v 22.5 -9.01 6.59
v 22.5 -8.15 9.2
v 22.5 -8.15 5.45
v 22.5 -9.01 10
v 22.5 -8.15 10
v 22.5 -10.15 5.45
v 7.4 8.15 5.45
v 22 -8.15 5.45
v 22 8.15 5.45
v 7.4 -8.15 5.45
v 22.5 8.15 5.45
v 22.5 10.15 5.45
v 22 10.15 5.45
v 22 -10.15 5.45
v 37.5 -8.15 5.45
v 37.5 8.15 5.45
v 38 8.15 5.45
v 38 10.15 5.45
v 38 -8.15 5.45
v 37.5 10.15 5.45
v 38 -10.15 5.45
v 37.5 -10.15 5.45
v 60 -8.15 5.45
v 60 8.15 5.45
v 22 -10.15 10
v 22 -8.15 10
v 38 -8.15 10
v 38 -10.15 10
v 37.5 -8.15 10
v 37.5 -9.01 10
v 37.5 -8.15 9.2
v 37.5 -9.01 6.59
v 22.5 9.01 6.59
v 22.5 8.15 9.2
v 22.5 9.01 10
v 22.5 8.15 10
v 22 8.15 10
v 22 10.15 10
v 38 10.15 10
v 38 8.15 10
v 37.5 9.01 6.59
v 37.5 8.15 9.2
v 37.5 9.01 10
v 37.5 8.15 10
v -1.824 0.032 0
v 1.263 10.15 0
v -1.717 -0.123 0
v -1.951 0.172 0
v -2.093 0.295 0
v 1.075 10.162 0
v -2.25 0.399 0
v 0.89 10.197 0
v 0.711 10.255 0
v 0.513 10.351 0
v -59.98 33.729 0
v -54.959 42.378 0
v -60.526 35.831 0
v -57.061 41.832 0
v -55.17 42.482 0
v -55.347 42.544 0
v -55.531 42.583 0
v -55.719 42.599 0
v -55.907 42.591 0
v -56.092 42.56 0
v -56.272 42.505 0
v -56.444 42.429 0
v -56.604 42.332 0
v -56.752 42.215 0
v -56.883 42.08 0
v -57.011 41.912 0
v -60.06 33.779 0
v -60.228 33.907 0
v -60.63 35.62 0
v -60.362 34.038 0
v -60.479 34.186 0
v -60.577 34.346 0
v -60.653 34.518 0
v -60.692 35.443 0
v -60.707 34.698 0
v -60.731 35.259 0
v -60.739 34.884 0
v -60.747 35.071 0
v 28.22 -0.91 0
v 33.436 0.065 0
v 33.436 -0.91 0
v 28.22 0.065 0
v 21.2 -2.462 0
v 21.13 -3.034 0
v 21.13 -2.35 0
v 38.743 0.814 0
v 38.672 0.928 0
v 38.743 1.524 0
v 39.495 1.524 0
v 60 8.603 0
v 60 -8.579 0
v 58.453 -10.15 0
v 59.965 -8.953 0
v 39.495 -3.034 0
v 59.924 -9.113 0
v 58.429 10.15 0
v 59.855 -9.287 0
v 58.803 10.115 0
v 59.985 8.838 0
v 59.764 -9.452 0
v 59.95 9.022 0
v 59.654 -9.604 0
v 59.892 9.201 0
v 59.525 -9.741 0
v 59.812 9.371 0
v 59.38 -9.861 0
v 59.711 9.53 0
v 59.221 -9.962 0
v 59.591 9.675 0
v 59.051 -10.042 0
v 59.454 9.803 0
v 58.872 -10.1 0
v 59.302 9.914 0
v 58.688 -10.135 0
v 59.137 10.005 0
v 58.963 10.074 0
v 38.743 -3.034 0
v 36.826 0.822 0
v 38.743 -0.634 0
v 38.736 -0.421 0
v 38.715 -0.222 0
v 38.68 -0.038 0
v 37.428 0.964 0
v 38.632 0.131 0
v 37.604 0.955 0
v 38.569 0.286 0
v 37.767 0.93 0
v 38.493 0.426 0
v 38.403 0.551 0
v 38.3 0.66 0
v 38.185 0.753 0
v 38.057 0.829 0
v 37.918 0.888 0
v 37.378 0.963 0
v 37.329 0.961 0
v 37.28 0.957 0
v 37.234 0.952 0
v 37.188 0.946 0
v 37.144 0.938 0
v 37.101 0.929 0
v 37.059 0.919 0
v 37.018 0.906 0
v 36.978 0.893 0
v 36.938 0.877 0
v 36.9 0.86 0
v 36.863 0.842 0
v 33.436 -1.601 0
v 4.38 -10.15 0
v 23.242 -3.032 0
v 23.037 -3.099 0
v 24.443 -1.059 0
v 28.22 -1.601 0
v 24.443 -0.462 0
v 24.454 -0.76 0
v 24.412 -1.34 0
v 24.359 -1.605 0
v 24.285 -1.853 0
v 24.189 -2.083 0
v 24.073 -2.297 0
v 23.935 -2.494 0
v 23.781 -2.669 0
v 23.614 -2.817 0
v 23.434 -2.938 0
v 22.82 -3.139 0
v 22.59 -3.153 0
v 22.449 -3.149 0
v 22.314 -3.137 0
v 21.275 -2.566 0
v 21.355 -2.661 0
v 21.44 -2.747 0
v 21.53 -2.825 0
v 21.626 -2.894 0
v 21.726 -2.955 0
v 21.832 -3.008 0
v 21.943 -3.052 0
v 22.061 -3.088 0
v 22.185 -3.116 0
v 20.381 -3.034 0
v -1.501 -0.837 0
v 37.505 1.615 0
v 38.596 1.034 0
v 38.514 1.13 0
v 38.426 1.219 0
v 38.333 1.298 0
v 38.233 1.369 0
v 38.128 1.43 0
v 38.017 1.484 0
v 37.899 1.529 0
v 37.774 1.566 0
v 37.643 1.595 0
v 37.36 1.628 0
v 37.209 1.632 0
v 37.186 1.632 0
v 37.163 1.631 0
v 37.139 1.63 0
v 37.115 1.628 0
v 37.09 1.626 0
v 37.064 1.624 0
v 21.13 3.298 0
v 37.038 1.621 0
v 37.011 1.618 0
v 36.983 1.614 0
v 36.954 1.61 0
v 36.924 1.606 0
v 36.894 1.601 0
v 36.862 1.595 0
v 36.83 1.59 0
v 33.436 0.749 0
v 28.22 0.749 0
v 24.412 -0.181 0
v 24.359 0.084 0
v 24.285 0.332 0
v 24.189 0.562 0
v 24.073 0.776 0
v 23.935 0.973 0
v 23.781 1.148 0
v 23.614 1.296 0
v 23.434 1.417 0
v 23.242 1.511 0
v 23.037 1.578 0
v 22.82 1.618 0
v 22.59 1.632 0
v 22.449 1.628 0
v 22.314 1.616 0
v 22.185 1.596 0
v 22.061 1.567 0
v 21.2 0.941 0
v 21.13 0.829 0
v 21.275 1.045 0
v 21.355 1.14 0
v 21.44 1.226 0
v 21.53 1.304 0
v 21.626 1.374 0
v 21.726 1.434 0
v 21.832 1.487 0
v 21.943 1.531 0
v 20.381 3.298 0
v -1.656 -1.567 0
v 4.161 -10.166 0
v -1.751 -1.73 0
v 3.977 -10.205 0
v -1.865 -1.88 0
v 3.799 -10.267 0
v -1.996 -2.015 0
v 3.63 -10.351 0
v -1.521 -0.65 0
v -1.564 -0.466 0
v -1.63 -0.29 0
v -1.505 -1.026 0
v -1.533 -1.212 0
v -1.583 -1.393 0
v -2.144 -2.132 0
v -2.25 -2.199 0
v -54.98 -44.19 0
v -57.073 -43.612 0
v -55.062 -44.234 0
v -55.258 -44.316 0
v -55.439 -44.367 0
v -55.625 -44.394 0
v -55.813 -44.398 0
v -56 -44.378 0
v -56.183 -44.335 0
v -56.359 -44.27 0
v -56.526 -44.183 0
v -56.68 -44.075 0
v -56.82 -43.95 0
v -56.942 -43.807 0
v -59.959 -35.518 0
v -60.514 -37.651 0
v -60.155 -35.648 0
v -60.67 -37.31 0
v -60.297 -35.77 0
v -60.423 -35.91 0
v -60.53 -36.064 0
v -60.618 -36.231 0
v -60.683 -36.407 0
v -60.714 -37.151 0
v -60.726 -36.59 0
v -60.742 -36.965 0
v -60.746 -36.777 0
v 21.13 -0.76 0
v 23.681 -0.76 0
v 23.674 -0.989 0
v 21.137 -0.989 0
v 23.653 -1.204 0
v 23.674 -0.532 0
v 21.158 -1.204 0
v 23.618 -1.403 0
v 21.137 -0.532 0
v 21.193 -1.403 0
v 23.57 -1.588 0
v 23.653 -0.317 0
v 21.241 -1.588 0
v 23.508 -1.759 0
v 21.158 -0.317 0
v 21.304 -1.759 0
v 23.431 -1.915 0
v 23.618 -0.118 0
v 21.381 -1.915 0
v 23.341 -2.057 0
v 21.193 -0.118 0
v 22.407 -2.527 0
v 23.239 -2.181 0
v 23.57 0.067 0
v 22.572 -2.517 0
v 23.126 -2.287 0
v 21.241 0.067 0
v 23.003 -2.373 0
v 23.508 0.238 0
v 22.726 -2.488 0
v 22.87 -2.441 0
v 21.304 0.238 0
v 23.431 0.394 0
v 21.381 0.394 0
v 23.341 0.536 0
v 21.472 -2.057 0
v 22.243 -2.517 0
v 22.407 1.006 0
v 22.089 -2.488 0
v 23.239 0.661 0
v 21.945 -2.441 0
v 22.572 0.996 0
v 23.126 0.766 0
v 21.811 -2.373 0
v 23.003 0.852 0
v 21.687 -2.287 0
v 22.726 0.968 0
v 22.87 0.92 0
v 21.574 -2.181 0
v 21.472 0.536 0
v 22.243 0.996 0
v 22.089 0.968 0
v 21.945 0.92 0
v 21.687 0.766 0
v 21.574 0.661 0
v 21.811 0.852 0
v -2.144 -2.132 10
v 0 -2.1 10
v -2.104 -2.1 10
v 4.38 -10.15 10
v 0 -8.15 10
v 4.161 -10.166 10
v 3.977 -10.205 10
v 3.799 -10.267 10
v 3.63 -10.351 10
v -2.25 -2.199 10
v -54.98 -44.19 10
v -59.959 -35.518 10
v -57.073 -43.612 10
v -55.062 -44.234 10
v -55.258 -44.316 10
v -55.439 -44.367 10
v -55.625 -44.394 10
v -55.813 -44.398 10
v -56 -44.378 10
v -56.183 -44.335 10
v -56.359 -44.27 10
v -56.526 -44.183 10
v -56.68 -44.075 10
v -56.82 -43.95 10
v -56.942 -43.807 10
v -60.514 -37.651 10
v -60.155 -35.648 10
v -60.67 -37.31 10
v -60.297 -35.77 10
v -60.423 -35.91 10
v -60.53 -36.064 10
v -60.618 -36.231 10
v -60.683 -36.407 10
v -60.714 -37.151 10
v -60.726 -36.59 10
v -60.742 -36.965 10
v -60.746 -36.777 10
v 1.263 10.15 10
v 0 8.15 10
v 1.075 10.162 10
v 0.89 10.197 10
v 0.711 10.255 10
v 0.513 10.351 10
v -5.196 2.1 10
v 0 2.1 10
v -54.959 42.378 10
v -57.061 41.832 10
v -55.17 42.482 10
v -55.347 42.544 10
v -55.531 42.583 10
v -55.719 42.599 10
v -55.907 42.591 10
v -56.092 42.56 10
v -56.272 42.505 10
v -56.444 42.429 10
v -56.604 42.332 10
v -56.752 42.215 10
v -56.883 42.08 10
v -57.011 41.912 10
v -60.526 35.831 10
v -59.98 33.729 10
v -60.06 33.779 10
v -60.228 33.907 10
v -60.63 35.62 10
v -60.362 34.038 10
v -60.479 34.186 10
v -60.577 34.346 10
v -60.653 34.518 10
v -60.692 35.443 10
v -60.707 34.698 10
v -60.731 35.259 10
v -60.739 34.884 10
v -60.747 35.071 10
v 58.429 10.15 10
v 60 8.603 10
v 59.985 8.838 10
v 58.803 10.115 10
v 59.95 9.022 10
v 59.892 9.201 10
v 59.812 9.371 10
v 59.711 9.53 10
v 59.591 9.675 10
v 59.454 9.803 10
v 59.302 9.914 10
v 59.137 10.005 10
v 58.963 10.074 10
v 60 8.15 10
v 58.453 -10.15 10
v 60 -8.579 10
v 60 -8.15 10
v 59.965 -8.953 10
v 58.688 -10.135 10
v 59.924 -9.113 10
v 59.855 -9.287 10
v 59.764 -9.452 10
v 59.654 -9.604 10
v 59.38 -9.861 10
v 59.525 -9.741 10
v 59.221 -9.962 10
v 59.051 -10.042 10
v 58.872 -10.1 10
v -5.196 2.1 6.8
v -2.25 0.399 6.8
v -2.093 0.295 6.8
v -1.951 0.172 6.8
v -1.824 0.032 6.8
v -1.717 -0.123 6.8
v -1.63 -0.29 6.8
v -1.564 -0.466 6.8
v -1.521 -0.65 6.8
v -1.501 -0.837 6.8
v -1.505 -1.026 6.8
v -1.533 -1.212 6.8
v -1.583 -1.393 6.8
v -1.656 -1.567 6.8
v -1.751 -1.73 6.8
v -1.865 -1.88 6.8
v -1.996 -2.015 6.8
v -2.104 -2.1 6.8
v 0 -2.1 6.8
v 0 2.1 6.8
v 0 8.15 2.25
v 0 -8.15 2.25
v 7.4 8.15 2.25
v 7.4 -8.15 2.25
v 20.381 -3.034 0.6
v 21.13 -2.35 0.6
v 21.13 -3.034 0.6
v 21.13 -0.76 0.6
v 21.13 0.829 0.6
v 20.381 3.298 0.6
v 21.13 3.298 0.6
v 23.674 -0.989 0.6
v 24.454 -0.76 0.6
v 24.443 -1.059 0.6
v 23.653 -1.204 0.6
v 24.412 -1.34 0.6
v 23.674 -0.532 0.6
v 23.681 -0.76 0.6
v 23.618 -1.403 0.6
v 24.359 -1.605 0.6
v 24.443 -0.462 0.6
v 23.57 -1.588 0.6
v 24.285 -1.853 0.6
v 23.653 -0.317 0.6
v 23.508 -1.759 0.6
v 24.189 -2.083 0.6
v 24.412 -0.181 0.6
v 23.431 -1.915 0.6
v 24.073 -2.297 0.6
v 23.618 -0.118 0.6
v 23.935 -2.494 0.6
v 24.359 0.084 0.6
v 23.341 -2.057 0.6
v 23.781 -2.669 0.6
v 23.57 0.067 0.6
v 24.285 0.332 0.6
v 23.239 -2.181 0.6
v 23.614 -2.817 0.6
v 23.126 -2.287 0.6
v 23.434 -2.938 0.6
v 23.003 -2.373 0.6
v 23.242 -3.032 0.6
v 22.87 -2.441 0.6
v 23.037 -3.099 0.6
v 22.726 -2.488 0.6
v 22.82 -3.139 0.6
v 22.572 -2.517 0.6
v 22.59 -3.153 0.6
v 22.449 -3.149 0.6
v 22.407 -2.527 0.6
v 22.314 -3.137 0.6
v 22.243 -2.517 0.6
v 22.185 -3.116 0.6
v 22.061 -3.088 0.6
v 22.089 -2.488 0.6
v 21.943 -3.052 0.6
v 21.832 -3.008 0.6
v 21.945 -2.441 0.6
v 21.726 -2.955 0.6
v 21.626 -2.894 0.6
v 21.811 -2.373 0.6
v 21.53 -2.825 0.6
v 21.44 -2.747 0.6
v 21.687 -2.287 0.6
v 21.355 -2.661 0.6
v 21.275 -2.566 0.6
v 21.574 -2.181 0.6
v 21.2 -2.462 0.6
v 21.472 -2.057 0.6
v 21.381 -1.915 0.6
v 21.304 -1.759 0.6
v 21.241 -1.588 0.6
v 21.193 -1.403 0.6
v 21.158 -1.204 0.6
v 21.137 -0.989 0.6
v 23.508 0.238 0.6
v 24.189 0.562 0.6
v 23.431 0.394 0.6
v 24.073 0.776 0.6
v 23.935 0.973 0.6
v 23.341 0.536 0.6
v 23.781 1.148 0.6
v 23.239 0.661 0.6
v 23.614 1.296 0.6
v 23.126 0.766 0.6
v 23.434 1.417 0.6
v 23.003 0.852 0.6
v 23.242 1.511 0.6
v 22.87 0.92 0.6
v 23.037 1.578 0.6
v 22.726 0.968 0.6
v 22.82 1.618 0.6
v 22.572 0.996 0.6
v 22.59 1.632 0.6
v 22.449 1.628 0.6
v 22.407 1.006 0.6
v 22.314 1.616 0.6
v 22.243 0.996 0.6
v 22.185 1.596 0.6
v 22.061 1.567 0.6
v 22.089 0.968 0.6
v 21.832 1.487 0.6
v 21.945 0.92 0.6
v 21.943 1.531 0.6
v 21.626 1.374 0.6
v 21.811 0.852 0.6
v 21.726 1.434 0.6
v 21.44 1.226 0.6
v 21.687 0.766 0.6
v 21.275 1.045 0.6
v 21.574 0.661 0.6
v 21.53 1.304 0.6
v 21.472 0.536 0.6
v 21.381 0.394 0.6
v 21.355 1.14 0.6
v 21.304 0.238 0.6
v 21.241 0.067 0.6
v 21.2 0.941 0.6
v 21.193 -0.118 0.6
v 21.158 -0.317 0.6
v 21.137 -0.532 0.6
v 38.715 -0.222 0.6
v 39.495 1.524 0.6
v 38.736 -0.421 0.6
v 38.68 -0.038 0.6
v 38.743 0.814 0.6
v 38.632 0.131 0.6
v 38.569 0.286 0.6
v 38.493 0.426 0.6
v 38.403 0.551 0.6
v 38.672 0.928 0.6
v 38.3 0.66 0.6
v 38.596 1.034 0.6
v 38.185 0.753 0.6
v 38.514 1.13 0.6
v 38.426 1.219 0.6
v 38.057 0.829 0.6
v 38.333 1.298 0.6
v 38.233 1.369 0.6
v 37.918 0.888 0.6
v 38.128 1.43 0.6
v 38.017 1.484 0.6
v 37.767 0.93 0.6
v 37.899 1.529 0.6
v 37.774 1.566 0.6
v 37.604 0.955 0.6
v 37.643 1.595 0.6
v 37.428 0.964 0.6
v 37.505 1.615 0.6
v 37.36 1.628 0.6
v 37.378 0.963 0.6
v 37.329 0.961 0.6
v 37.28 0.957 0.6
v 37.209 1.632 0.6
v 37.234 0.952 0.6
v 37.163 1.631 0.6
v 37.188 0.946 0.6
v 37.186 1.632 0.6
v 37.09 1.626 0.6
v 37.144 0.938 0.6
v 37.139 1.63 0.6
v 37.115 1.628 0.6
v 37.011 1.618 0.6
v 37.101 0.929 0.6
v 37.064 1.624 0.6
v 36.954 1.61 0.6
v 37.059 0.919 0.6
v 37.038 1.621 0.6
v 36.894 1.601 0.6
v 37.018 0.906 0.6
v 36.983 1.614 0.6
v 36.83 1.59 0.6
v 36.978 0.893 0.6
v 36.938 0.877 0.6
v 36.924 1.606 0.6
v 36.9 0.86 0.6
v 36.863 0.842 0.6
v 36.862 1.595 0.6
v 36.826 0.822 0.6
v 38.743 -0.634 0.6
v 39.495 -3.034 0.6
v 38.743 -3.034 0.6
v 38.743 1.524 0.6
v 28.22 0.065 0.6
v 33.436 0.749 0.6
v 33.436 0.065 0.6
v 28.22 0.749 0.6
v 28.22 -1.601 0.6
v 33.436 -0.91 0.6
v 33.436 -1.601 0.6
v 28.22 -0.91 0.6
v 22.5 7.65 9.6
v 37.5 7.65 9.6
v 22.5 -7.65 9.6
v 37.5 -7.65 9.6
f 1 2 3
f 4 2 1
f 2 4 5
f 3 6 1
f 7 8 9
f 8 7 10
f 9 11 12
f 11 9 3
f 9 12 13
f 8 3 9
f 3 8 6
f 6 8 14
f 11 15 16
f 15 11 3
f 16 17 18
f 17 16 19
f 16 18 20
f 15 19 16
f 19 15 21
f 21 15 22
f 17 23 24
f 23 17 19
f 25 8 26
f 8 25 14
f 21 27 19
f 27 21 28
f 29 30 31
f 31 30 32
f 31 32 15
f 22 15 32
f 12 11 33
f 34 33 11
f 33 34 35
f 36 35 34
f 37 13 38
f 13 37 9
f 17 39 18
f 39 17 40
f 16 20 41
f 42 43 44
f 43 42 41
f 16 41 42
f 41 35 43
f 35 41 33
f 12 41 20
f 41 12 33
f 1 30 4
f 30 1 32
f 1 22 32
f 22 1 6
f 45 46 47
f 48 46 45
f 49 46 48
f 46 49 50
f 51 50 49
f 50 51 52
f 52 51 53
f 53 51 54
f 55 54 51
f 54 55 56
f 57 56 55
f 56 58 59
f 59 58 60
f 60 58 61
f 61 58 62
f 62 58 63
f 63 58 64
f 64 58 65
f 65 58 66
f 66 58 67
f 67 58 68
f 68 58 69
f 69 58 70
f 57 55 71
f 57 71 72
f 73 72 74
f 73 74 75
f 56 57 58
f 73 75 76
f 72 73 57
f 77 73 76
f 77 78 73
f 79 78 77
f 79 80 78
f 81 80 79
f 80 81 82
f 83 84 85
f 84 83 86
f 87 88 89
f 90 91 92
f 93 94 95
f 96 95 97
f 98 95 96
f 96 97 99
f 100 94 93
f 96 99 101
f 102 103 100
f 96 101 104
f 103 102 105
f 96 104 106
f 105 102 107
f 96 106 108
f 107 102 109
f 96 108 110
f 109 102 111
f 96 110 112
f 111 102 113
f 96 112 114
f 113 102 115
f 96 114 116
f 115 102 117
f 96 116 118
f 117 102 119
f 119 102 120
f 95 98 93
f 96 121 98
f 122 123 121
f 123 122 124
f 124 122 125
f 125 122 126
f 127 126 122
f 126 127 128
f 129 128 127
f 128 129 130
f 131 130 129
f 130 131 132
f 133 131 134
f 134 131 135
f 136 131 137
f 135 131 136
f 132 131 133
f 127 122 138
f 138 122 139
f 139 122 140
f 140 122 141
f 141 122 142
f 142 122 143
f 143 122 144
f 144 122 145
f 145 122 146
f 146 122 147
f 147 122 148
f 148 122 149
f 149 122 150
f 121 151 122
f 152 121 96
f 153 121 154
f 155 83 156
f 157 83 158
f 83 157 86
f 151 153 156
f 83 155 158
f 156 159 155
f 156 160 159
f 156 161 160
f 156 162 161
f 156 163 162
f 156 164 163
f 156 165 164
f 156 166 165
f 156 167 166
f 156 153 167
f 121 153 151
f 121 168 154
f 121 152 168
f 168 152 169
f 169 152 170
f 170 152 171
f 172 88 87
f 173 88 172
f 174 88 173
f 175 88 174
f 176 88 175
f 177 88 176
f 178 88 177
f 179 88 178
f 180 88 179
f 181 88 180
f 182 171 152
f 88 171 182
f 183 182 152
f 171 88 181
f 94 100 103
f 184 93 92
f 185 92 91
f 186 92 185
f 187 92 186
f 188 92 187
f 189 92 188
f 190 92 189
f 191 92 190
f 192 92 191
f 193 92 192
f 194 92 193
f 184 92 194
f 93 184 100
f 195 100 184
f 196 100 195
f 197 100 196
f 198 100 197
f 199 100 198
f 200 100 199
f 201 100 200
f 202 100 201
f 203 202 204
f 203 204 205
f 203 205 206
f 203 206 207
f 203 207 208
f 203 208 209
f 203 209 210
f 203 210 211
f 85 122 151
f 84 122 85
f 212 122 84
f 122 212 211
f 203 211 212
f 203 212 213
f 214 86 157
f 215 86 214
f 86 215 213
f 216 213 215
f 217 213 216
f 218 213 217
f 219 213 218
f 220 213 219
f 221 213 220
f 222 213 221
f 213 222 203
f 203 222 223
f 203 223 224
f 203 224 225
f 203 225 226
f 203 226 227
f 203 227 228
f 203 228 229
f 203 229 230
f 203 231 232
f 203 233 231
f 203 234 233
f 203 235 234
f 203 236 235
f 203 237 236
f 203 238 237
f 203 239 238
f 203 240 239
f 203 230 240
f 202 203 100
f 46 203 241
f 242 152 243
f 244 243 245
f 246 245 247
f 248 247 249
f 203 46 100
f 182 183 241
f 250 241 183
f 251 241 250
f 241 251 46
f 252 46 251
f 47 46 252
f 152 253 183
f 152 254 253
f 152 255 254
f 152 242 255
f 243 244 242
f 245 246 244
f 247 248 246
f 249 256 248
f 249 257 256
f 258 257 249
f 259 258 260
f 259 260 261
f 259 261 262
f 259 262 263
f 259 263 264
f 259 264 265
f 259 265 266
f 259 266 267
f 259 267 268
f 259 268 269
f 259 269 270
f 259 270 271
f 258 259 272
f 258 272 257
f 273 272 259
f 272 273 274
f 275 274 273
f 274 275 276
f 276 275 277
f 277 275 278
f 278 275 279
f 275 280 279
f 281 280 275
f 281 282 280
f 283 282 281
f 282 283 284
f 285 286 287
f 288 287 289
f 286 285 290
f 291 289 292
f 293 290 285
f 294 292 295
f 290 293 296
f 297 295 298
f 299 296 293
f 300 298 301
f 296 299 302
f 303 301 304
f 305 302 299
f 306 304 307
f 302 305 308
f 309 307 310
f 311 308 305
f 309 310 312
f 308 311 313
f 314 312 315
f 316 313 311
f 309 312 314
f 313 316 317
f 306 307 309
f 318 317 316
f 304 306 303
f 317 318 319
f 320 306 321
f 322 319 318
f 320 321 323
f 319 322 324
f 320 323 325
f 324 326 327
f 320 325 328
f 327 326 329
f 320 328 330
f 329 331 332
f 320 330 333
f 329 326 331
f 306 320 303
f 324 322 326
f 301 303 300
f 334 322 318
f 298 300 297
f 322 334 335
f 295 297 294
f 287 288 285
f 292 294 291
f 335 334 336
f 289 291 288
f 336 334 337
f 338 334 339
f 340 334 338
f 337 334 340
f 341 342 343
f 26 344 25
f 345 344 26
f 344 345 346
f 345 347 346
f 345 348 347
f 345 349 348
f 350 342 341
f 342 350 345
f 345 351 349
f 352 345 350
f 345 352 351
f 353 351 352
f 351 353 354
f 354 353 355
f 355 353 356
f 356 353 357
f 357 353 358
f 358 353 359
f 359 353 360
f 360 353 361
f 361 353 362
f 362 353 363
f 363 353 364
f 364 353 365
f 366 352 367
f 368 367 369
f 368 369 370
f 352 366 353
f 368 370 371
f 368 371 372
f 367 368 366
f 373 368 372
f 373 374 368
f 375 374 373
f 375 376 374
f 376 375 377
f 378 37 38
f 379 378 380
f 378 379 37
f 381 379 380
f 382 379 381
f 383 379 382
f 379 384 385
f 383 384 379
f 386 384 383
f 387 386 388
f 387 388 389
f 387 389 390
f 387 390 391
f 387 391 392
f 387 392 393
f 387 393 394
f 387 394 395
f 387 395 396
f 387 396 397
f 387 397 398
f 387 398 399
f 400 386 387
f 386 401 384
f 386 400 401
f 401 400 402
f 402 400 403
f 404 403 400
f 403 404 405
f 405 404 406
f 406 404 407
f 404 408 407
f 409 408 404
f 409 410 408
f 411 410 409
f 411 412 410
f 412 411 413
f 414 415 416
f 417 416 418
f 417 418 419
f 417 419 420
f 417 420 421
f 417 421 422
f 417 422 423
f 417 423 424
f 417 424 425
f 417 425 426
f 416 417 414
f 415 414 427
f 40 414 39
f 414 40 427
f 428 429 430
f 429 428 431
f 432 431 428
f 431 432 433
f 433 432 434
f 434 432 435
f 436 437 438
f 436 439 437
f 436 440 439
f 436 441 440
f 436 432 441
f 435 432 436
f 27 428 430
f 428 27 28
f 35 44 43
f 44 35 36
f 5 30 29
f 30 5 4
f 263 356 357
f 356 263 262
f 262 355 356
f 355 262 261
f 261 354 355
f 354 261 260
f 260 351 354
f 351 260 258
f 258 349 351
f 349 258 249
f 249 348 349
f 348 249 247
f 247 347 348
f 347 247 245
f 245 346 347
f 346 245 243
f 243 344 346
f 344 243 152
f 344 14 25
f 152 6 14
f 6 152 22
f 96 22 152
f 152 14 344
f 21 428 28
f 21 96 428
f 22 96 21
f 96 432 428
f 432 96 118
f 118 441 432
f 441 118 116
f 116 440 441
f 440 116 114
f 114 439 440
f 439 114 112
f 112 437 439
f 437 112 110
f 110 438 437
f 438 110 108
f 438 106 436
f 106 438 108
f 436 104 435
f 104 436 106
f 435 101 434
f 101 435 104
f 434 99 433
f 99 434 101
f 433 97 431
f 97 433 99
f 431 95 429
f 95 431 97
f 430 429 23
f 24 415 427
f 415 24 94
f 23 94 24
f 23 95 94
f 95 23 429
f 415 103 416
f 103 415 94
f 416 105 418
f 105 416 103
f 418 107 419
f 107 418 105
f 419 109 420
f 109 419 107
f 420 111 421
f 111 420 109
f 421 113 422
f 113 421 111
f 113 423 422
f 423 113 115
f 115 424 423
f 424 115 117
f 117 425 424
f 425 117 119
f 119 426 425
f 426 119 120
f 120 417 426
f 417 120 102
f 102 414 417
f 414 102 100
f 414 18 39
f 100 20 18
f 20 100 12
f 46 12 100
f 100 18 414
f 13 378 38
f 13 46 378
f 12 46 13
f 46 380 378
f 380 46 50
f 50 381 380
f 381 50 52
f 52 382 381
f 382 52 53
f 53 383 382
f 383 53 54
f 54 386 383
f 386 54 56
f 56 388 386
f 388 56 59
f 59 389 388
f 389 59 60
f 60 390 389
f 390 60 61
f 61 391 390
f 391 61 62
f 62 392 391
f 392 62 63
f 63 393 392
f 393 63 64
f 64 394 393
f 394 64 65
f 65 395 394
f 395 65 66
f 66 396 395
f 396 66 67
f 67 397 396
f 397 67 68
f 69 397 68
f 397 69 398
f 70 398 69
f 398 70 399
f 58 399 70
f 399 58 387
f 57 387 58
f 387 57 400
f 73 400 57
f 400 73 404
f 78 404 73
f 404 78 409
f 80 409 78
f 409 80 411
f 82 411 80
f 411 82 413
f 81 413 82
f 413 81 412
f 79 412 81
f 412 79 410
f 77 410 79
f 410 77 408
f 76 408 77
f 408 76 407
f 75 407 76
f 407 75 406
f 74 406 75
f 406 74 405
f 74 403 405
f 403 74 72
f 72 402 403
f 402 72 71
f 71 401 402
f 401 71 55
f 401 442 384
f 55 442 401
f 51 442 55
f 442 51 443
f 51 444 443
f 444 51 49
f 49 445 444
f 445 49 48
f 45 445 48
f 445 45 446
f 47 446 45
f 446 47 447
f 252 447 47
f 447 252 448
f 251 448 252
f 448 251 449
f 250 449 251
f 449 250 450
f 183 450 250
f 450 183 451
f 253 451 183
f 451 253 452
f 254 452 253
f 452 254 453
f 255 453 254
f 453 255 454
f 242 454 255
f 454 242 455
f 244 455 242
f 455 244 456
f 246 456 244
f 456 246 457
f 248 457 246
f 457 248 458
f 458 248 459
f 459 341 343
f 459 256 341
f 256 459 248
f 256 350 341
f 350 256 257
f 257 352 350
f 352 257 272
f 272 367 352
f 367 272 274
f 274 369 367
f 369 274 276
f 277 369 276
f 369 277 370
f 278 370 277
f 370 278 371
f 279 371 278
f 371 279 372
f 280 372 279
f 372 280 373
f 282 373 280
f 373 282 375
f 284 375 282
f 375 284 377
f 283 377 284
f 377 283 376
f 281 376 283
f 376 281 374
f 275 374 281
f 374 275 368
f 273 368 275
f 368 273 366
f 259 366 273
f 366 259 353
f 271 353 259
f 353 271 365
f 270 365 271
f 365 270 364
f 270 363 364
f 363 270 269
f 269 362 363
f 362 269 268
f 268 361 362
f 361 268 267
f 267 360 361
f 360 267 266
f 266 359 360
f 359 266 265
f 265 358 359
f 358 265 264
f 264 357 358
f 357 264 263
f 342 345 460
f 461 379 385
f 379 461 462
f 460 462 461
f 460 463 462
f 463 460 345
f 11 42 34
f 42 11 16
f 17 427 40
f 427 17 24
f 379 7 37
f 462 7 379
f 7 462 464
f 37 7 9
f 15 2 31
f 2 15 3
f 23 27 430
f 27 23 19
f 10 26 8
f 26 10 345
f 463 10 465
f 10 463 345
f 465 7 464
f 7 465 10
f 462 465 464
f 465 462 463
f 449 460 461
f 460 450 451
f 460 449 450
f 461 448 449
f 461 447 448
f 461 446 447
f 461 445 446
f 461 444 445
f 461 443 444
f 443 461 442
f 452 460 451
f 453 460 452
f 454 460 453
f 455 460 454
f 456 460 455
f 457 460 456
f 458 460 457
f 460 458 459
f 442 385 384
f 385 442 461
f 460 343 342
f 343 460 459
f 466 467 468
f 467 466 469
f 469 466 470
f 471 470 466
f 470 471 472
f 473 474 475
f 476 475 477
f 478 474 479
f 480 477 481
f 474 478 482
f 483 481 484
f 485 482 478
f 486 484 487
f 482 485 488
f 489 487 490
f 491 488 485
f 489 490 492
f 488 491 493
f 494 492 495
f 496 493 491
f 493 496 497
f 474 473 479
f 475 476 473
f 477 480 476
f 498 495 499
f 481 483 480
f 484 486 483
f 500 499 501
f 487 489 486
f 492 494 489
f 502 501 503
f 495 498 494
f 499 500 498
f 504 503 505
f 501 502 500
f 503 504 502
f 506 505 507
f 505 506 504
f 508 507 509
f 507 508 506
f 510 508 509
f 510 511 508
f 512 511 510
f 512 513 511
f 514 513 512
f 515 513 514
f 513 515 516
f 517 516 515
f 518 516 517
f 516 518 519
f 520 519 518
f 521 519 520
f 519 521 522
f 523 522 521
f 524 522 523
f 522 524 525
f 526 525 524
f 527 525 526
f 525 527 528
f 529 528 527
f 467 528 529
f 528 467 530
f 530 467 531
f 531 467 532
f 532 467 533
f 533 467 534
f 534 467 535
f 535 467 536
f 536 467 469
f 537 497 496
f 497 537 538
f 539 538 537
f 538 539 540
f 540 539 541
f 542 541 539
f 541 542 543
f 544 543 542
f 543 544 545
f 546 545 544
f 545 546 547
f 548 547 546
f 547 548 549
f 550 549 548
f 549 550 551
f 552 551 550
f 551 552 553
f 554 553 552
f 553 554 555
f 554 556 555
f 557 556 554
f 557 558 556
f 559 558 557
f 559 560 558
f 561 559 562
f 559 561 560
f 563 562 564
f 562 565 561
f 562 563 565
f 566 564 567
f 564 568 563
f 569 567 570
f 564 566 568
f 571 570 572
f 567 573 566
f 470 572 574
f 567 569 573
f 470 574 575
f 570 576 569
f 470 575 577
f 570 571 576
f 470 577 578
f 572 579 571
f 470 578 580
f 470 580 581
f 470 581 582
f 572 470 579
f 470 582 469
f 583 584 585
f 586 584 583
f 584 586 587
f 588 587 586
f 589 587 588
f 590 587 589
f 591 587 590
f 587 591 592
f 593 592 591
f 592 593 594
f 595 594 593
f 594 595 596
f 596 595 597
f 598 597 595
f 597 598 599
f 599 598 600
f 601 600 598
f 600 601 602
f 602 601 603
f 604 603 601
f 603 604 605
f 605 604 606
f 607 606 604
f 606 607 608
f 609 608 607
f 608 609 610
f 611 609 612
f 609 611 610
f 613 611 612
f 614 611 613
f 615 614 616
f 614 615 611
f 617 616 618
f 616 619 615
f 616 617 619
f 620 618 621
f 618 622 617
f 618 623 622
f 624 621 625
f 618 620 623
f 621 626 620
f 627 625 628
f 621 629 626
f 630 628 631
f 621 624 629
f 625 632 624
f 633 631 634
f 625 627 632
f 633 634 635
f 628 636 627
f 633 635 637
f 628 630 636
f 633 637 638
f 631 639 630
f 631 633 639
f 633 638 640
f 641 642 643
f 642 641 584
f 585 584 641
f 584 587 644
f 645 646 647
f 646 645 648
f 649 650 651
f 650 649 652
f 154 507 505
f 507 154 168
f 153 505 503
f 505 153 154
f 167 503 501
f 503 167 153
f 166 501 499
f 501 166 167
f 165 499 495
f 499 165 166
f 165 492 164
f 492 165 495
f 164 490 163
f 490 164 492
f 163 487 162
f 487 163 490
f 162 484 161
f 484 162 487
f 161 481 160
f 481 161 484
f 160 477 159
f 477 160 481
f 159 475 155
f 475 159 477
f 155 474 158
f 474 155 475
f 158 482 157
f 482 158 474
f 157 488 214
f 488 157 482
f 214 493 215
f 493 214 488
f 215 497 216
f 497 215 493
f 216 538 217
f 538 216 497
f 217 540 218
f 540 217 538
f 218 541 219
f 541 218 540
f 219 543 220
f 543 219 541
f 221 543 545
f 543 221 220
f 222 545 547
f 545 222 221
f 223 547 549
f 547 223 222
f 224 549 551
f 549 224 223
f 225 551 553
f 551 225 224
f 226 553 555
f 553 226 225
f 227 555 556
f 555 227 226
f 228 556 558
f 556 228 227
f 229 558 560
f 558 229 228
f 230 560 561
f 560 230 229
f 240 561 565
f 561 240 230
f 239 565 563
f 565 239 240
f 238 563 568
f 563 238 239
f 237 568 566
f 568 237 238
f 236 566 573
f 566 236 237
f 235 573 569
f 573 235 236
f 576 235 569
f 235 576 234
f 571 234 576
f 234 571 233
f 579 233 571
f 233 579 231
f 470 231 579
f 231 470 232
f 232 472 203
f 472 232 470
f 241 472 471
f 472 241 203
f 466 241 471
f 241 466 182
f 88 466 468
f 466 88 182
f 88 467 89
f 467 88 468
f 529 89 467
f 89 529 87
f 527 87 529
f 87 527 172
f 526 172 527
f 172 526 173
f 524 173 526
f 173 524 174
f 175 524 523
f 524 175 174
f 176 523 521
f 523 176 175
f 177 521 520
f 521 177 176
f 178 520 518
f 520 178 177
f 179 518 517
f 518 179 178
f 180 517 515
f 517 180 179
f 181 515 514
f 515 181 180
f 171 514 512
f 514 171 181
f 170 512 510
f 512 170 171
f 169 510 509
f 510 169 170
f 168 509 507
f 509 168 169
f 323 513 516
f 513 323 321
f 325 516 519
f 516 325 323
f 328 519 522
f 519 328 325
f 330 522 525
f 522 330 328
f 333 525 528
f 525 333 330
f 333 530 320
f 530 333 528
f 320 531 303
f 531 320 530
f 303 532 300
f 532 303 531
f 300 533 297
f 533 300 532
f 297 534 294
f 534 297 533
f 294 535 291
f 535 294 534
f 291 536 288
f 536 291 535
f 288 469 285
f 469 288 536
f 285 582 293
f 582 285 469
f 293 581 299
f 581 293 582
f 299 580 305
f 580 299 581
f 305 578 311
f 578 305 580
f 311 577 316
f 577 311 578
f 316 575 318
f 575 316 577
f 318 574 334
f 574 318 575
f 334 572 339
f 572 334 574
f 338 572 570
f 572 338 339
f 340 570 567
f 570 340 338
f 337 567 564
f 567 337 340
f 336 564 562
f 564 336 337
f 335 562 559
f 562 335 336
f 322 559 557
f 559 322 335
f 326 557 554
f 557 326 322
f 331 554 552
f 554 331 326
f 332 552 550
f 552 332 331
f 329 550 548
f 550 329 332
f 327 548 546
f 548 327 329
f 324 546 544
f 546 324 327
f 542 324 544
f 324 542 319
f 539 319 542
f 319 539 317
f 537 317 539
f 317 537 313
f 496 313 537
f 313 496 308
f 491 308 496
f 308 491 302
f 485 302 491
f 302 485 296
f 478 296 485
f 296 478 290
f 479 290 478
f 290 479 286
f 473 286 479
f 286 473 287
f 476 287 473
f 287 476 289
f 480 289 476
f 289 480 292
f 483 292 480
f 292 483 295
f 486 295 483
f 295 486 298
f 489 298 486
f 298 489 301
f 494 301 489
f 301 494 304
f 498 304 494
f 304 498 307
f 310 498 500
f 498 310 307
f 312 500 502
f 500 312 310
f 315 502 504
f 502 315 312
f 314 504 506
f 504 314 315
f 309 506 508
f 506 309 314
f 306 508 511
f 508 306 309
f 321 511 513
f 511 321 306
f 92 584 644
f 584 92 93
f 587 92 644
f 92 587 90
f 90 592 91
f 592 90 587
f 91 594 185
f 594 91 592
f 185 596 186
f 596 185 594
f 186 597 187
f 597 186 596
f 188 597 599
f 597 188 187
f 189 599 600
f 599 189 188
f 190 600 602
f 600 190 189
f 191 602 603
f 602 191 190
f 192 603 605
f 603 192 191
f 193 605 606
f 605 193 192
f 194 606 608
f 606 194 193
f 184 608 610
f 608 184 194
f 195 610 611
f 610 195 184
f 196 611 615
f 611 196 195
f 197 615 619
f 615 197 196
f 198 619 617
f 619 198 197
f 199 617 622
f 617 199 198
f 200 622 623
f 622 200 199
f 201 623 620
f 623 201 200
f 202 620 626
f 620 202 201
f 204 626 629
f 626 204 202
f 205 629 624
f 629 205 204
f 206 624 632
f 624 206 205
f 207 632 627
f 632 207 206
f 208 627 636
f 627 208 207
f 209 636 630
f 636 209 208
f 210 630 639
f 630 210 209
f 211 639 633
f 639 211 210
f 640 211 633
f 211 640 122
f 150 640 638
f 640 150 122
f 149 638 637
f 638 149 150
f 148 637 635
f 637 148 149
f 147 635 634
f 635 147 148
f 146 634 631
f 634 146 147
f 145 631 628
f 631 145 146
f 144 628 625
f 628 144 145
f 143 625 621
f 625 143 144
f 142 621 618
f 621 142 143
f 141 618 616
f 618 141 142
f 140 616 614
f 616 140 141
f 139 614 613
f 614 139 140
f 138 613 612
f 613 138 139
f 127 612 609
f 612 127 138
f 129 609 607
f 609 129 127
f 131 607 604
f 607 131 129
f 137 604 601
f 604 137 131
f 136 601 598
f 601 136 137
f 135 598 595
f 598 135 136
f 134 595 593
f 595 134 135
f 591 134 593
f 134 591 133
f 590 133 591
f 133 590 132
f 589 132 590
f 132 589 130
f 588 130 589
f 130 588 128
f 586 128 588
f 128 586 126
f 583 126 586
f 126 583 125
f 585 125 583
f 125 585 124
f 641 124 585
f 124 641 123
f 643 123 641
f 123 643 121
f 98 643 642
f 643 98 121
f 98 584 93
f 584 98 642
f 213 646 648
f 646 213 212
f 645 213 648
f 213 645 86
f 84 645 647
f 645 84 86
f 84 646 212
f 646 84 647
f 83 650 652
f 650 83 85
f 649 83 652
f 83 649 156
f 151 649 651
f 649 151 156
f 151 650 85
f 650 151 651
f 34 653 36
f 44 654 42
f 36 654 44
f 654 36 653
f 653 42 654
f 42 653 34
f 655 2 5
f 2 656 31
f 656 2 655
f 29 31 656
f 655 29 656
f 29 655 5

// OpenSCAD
// radius gauge attachment for calipers - https://www.printables.com/model/122532-improved-radius-gauge-for-calipers
//inspired by https://www.prusaprinters.org/prints/14474-radius-gauge-for-calipers

// note: my calipers are very cheap, change the fitment settings to suit your own (appears mostly universal so feel free to try this first)

// radius of measured object = 
//    caliper measurement * sin(interior_angle) / (1-sin(interior_angle))



/* [Important] */

// the angle in the interior arms that determines the equation used to get the final measurement (see the bottomside label). Smaller values give longer arms but more precision and easier measurements.
interior_angle=30; //[11.5370, 19.4712, 30, 41.8103, 45, 48.5904]
// respectively: D=d/2, D=d, r=d, r=2*d, r=(sqrt(2)+q)*d  using a smaller number will increase the arm length considerably, but increase simplicity/speed of use and measurement precision. You can set this to any angle and the measurement multiplier will be displayed in the console output.

// maximum measurable radius (specifies arm length, calculated arm length shown in console output)
maximum_radius=40;



/* [Strength and Rigidity] */

// the length up the caliper the gauge will sit, make sure it is long enough to stay sturdy
caliper_support_length=60;
// total thickness of the model
total_thickness=10; //[0:0.1:20]
// side wall thickness of the section surrounding the caliper
caliper_side_wall=2; //[0:0.1:10]
// width of the arms
arm_width=10; //[0:0.1:40]
// extends the wall in the V of the arms to help with flex
minimum_radius=0; //[0:0.1:30]



/* [Fitment] */

// largest width of the caliper arm
caliper_width=16; //[0:0.1:30]
// largest thickness of the caliper arm
caliper_thickness=3.6; //[0:0.1:10]
// width of the caliper sliding arm
caliper_slide_width=3.8; //[0:0.1:10]
// thickness of the caliper sliding arm
caliper_slide_thickness=2; //[0:0.1:10]
// width of the end tip of the caliper sliding arm
caliper_slide_tip_width=2; //[0:0.1:10]
// width of the plate holding the caliper together
caliper_plate_width=7; //[0:0.1:20]
// depth of the plate holding the caliper together
caliper_plate_depth=2; //[0:0.1:10]



/* [Clips for Caliper] */
// enable if you would like to clip the caliper into the gauge, rather than sit it in place
clips=true;
// Z height of the caliper clips. Adjust such that the overhang angle is printable (check console output)
clip_height=0.8;
// Y width of the caliper clips
clip_width=0.5;
// length of the clip
clip_length=15;
// provide a gap either side of the clip to enable it to flex
clip_seperation_gap=0.5;
// wall thickness of the clips
clip_thickness=0.86;



/* [Hole for Magnet] */
// enable if you would like to add an interior hole for a magnet
magnet=false;
number_of_magnets=2;
magnet_shape="cube"; //["cube", "cylinder"]
// applies to both cylinder and cube. Ensure total_thickness is enough to encompass magnet
magnet_thickness=2; //[0:0.1:10]
// applies if cylinder
magnet_diameter=14; //[0:0.1:50]
// applies if cube
magnet_width=10; //[0:0.1:50]
// applies if cube
magnet_length=20; //[0:0.1:50]
// applies if number of magnets > 1
magnet_spacing=2; //[0:0.1:20]
// turn off before rendering
preview_magnet=false;




/* [Embedded Label for Measurement Equation] */
enable_label=true;
font_style="osifont";
font_size=6; //[0:0.1:30]
font_depth=0.6; //[0:0.1:3]
decimal_places=3; //[5]


/* [Aesthetic] */

// add fillets to the corners of the model
XY_fillet_radius=1.5; //[0:0.1:10]



/* [Resolution] */
$fn=50; //[200]
tolerance=0.15; //[0:0.01:1]
clearance=0.4; //[0:0.1:2]



/* [Hidden] */

// Derived values

// width of the model around the caliper section
total_width_caliper=caliper_width+2*tolerance+2*caliper_side_wall;

// offset the caliper slightly such that the tip of the slide is centered in the arms
caliper_slide_exit_offset=caliper_slide_tip_width/2 - caliper_slide_width/2;
echo(caliper_slide_exit_offset=caliper_slide_exit_offset);

// check the lengths of the arms
arm_length=maximum_radius/tan(interior_angle);
echo(arm_length=arm_length);

// check the overhang of the clips (shouldn't be a big deal on most printers)
clip_overhang_angle=90-atan(clip_height/2/clip_width);
echo(clip_overhang_angle=clip_overhang_angle);

// amount to move magnet across
magnet_x=magnet_spacing + (magnet_shape=="cylinder" ? magnet_diameter : magnet_length);

// amount to multiply the measured value by to get the radius
measurement_multiplier=((interior_angle<30) ? 2 : 1)*sin(interior_angle) / (1-sin(interior_angle));
echo(measurement_multiplier=measurement_multiplier);
label_string=str((interior_angle<30) ? "D = " : "r = ", abs(measurement_multiplier-1) < 0.001 ? "" : round(measurement_multiplier*10^decimal_places)/10^decimal_places, "d");



// draw object
if (preview_magnet==false)
{
    radius_gauge();
}
else
{
    %radius_gauge();
    magnet();
}

// MAIN
module radius_gauge()
{
    difference()
    {
        
        //main body
        linear_extrude(total_thickness, convexity=2)
        offset(r = -XY_fillet_radius)
        offset(r = 2*XY_fillet_radius)
        offset(r = -XY_fillet_radius)
        union()
        {
            translate([0, -total_width_caliper/2])
            square([caliper_support_length, total_width_caliper]);
            
            //arms
            rotate([0,0,180])
            translate([0,-caliper_slide_exit_offset])
            mirror_offset(v=[0,1,0], duplicate=true)
            rotate([0,0,interior_angle])
            square([arm_length+XY_fillet_radius, arm_width]);
            
            intersection()
            {
                rotate([0,0,180])
                translate([0,-caliper_slide_exit_offset])
                mirror_offset(v=[0,1,0], duplicate=true)
                rotate([0,0,interior_angle])
                translate([-arm_length,0,0])
                square([arm_length, arm_width]);
                
                translate([0, -total_width_caliper/2])
                square([caliper_support_length, total_width_caliper]);
            }
            
        }
        
        //main caliper slot
        translate([0, -(caliper_width+2*tolerance)/2, total_thickness-(caliper_thickness+clip_height+tolerance)])
        cube([caliper_support_length+1, caliper_width+2*tolerance, caliper_thickness+clip_height+1]);
        
        //caliper plate clearance divet
        translate([0, -(caliper_width+2*tolerance)/2, total_thickness-(caliper_thickness+clip_height+tolerance)-(caliper_plate_depth+clip_height+clearance)])
        cube([caliper_plate_width+clearance, caliper_width+2*tolerance, caliper_plate_depth+clip_height+1]);
        
        //caliper slide clearance divet
        translate([-10, -(caliper_slide_width+clearance)/2, total_thickness-(caliper_slide_thickness+clip_height+clearance)])
        cube([11, caliper_slide_width+clearance, caliper_slide_thickness+clip_height+1]);
        
        //equation label
        if (enable_label==true)
        {
            translate([caliper_support_length/2,0,-1])
            linear_extrude(font_depth+1,convexity=2)
            rotate([180,0,180])
            text(label_string, font=font_style, size=font_size, halign="center", valign="center");
        }
        
        // clip mechanisms
        if (clips==true)
        {
            // clip seperation gaps
            mirror_offset(v=[0,1,0], duplicate=true)
            mirror_offset(v=[1,0,0], p=[caliper_support_length/2,0,0], duplicate=true)
            translate([caliper_support_length/2+clip_length/2, -total_width_caliper/2-1,total_thickness-(caliper_thickness+clip_height+tolerance)])
            cube([clip_seperation_gap, caliper_side_wall+2, caliper_thickness+clip_height+1]);
            
            // thin clip walls
            mirror_offset(v=[0,1,0], duplicate=true)
            translate([caliper_support_length/2, total_width_caliper/2, total_thickness-(caliper_thickness+clip_height+tolerance)+total_thickness/2])
            difference()
            {
                cube([clip_length+clip_seperation_gap, 2*(caliper_side_wall-clip_thickness), total_thickness], center=true);
                
                translate([-(clip_length+clip_seperation_gap+2)/2,0, -total_thickness/2])
                rotate([45,0,0])
                mirror([0,1,0])
                cube([clip_length+clip_seperation_gap+2,10,10]);
            }
        }
        
        //magnet hole
        if (magnet==true)
        {
            magnet();
            echo(magnet_depth=(total_thickness-(caliper_thickness+clip_height))/2-(magnet_thickness+tolerance)/2);
            echo(PAUSE_AT_Z_HEIGHT=(total_thickness-(caliper_thickness+clip_height))/2+(magnet_thickness+tolerance)/2);
        }
    }

    //thicken extra wall determined by minimum_radius
    translate([-minimum_radius, -caliper_width/2+caliper_slide_exit_offset, 0])
    cube([minimum_radius,caliper_width,total_thickness-(caliper_slide_thickness+clip_height+clearance)]);

    //slot mechanism clips
    if (clips == true)
    {
        mirror_offset(v=[0,1,0], duplicate=true)
        translate([caliper_support_length/2,-(caliper_width+2*tolerance)/2,total_thickness-clip_height/2])
        rotate([0,90,0])
        linear_extrude(clip_length, center=true)
        polygon([ [0,0], [clip_height/2,0], [0,clip_width], [-clip_height/2,0] ]);
    }
}

module magnet()
{
    translate([caliper_support_length/2-(number_of_magnets-1)*magnet_x/2, 0, (total_thickness-(caliper_thickness+clip_height))/2])
    for (i=[1:number_of_magnets])
    {
        translate([(i-1)*magnet_x,0,0])
        if (magnet_shape=="cylinder")
        {
            cylinder(h=magnet_thickness+tolerance, d=magnet_diameter+tolerance, center=true);
        }
        else
        {
            cube([magnet_length, magnet_width, magnet_thickness]+tolerance*[1,1,1], center=true);
        }
    }
}


module mirror_offset(v, p=[0,0,0], duplicate=false)
{
    
    mirror(v)
    translate(-2*p)
    children();
    
    if(duplicate){ children(); }
    
}
